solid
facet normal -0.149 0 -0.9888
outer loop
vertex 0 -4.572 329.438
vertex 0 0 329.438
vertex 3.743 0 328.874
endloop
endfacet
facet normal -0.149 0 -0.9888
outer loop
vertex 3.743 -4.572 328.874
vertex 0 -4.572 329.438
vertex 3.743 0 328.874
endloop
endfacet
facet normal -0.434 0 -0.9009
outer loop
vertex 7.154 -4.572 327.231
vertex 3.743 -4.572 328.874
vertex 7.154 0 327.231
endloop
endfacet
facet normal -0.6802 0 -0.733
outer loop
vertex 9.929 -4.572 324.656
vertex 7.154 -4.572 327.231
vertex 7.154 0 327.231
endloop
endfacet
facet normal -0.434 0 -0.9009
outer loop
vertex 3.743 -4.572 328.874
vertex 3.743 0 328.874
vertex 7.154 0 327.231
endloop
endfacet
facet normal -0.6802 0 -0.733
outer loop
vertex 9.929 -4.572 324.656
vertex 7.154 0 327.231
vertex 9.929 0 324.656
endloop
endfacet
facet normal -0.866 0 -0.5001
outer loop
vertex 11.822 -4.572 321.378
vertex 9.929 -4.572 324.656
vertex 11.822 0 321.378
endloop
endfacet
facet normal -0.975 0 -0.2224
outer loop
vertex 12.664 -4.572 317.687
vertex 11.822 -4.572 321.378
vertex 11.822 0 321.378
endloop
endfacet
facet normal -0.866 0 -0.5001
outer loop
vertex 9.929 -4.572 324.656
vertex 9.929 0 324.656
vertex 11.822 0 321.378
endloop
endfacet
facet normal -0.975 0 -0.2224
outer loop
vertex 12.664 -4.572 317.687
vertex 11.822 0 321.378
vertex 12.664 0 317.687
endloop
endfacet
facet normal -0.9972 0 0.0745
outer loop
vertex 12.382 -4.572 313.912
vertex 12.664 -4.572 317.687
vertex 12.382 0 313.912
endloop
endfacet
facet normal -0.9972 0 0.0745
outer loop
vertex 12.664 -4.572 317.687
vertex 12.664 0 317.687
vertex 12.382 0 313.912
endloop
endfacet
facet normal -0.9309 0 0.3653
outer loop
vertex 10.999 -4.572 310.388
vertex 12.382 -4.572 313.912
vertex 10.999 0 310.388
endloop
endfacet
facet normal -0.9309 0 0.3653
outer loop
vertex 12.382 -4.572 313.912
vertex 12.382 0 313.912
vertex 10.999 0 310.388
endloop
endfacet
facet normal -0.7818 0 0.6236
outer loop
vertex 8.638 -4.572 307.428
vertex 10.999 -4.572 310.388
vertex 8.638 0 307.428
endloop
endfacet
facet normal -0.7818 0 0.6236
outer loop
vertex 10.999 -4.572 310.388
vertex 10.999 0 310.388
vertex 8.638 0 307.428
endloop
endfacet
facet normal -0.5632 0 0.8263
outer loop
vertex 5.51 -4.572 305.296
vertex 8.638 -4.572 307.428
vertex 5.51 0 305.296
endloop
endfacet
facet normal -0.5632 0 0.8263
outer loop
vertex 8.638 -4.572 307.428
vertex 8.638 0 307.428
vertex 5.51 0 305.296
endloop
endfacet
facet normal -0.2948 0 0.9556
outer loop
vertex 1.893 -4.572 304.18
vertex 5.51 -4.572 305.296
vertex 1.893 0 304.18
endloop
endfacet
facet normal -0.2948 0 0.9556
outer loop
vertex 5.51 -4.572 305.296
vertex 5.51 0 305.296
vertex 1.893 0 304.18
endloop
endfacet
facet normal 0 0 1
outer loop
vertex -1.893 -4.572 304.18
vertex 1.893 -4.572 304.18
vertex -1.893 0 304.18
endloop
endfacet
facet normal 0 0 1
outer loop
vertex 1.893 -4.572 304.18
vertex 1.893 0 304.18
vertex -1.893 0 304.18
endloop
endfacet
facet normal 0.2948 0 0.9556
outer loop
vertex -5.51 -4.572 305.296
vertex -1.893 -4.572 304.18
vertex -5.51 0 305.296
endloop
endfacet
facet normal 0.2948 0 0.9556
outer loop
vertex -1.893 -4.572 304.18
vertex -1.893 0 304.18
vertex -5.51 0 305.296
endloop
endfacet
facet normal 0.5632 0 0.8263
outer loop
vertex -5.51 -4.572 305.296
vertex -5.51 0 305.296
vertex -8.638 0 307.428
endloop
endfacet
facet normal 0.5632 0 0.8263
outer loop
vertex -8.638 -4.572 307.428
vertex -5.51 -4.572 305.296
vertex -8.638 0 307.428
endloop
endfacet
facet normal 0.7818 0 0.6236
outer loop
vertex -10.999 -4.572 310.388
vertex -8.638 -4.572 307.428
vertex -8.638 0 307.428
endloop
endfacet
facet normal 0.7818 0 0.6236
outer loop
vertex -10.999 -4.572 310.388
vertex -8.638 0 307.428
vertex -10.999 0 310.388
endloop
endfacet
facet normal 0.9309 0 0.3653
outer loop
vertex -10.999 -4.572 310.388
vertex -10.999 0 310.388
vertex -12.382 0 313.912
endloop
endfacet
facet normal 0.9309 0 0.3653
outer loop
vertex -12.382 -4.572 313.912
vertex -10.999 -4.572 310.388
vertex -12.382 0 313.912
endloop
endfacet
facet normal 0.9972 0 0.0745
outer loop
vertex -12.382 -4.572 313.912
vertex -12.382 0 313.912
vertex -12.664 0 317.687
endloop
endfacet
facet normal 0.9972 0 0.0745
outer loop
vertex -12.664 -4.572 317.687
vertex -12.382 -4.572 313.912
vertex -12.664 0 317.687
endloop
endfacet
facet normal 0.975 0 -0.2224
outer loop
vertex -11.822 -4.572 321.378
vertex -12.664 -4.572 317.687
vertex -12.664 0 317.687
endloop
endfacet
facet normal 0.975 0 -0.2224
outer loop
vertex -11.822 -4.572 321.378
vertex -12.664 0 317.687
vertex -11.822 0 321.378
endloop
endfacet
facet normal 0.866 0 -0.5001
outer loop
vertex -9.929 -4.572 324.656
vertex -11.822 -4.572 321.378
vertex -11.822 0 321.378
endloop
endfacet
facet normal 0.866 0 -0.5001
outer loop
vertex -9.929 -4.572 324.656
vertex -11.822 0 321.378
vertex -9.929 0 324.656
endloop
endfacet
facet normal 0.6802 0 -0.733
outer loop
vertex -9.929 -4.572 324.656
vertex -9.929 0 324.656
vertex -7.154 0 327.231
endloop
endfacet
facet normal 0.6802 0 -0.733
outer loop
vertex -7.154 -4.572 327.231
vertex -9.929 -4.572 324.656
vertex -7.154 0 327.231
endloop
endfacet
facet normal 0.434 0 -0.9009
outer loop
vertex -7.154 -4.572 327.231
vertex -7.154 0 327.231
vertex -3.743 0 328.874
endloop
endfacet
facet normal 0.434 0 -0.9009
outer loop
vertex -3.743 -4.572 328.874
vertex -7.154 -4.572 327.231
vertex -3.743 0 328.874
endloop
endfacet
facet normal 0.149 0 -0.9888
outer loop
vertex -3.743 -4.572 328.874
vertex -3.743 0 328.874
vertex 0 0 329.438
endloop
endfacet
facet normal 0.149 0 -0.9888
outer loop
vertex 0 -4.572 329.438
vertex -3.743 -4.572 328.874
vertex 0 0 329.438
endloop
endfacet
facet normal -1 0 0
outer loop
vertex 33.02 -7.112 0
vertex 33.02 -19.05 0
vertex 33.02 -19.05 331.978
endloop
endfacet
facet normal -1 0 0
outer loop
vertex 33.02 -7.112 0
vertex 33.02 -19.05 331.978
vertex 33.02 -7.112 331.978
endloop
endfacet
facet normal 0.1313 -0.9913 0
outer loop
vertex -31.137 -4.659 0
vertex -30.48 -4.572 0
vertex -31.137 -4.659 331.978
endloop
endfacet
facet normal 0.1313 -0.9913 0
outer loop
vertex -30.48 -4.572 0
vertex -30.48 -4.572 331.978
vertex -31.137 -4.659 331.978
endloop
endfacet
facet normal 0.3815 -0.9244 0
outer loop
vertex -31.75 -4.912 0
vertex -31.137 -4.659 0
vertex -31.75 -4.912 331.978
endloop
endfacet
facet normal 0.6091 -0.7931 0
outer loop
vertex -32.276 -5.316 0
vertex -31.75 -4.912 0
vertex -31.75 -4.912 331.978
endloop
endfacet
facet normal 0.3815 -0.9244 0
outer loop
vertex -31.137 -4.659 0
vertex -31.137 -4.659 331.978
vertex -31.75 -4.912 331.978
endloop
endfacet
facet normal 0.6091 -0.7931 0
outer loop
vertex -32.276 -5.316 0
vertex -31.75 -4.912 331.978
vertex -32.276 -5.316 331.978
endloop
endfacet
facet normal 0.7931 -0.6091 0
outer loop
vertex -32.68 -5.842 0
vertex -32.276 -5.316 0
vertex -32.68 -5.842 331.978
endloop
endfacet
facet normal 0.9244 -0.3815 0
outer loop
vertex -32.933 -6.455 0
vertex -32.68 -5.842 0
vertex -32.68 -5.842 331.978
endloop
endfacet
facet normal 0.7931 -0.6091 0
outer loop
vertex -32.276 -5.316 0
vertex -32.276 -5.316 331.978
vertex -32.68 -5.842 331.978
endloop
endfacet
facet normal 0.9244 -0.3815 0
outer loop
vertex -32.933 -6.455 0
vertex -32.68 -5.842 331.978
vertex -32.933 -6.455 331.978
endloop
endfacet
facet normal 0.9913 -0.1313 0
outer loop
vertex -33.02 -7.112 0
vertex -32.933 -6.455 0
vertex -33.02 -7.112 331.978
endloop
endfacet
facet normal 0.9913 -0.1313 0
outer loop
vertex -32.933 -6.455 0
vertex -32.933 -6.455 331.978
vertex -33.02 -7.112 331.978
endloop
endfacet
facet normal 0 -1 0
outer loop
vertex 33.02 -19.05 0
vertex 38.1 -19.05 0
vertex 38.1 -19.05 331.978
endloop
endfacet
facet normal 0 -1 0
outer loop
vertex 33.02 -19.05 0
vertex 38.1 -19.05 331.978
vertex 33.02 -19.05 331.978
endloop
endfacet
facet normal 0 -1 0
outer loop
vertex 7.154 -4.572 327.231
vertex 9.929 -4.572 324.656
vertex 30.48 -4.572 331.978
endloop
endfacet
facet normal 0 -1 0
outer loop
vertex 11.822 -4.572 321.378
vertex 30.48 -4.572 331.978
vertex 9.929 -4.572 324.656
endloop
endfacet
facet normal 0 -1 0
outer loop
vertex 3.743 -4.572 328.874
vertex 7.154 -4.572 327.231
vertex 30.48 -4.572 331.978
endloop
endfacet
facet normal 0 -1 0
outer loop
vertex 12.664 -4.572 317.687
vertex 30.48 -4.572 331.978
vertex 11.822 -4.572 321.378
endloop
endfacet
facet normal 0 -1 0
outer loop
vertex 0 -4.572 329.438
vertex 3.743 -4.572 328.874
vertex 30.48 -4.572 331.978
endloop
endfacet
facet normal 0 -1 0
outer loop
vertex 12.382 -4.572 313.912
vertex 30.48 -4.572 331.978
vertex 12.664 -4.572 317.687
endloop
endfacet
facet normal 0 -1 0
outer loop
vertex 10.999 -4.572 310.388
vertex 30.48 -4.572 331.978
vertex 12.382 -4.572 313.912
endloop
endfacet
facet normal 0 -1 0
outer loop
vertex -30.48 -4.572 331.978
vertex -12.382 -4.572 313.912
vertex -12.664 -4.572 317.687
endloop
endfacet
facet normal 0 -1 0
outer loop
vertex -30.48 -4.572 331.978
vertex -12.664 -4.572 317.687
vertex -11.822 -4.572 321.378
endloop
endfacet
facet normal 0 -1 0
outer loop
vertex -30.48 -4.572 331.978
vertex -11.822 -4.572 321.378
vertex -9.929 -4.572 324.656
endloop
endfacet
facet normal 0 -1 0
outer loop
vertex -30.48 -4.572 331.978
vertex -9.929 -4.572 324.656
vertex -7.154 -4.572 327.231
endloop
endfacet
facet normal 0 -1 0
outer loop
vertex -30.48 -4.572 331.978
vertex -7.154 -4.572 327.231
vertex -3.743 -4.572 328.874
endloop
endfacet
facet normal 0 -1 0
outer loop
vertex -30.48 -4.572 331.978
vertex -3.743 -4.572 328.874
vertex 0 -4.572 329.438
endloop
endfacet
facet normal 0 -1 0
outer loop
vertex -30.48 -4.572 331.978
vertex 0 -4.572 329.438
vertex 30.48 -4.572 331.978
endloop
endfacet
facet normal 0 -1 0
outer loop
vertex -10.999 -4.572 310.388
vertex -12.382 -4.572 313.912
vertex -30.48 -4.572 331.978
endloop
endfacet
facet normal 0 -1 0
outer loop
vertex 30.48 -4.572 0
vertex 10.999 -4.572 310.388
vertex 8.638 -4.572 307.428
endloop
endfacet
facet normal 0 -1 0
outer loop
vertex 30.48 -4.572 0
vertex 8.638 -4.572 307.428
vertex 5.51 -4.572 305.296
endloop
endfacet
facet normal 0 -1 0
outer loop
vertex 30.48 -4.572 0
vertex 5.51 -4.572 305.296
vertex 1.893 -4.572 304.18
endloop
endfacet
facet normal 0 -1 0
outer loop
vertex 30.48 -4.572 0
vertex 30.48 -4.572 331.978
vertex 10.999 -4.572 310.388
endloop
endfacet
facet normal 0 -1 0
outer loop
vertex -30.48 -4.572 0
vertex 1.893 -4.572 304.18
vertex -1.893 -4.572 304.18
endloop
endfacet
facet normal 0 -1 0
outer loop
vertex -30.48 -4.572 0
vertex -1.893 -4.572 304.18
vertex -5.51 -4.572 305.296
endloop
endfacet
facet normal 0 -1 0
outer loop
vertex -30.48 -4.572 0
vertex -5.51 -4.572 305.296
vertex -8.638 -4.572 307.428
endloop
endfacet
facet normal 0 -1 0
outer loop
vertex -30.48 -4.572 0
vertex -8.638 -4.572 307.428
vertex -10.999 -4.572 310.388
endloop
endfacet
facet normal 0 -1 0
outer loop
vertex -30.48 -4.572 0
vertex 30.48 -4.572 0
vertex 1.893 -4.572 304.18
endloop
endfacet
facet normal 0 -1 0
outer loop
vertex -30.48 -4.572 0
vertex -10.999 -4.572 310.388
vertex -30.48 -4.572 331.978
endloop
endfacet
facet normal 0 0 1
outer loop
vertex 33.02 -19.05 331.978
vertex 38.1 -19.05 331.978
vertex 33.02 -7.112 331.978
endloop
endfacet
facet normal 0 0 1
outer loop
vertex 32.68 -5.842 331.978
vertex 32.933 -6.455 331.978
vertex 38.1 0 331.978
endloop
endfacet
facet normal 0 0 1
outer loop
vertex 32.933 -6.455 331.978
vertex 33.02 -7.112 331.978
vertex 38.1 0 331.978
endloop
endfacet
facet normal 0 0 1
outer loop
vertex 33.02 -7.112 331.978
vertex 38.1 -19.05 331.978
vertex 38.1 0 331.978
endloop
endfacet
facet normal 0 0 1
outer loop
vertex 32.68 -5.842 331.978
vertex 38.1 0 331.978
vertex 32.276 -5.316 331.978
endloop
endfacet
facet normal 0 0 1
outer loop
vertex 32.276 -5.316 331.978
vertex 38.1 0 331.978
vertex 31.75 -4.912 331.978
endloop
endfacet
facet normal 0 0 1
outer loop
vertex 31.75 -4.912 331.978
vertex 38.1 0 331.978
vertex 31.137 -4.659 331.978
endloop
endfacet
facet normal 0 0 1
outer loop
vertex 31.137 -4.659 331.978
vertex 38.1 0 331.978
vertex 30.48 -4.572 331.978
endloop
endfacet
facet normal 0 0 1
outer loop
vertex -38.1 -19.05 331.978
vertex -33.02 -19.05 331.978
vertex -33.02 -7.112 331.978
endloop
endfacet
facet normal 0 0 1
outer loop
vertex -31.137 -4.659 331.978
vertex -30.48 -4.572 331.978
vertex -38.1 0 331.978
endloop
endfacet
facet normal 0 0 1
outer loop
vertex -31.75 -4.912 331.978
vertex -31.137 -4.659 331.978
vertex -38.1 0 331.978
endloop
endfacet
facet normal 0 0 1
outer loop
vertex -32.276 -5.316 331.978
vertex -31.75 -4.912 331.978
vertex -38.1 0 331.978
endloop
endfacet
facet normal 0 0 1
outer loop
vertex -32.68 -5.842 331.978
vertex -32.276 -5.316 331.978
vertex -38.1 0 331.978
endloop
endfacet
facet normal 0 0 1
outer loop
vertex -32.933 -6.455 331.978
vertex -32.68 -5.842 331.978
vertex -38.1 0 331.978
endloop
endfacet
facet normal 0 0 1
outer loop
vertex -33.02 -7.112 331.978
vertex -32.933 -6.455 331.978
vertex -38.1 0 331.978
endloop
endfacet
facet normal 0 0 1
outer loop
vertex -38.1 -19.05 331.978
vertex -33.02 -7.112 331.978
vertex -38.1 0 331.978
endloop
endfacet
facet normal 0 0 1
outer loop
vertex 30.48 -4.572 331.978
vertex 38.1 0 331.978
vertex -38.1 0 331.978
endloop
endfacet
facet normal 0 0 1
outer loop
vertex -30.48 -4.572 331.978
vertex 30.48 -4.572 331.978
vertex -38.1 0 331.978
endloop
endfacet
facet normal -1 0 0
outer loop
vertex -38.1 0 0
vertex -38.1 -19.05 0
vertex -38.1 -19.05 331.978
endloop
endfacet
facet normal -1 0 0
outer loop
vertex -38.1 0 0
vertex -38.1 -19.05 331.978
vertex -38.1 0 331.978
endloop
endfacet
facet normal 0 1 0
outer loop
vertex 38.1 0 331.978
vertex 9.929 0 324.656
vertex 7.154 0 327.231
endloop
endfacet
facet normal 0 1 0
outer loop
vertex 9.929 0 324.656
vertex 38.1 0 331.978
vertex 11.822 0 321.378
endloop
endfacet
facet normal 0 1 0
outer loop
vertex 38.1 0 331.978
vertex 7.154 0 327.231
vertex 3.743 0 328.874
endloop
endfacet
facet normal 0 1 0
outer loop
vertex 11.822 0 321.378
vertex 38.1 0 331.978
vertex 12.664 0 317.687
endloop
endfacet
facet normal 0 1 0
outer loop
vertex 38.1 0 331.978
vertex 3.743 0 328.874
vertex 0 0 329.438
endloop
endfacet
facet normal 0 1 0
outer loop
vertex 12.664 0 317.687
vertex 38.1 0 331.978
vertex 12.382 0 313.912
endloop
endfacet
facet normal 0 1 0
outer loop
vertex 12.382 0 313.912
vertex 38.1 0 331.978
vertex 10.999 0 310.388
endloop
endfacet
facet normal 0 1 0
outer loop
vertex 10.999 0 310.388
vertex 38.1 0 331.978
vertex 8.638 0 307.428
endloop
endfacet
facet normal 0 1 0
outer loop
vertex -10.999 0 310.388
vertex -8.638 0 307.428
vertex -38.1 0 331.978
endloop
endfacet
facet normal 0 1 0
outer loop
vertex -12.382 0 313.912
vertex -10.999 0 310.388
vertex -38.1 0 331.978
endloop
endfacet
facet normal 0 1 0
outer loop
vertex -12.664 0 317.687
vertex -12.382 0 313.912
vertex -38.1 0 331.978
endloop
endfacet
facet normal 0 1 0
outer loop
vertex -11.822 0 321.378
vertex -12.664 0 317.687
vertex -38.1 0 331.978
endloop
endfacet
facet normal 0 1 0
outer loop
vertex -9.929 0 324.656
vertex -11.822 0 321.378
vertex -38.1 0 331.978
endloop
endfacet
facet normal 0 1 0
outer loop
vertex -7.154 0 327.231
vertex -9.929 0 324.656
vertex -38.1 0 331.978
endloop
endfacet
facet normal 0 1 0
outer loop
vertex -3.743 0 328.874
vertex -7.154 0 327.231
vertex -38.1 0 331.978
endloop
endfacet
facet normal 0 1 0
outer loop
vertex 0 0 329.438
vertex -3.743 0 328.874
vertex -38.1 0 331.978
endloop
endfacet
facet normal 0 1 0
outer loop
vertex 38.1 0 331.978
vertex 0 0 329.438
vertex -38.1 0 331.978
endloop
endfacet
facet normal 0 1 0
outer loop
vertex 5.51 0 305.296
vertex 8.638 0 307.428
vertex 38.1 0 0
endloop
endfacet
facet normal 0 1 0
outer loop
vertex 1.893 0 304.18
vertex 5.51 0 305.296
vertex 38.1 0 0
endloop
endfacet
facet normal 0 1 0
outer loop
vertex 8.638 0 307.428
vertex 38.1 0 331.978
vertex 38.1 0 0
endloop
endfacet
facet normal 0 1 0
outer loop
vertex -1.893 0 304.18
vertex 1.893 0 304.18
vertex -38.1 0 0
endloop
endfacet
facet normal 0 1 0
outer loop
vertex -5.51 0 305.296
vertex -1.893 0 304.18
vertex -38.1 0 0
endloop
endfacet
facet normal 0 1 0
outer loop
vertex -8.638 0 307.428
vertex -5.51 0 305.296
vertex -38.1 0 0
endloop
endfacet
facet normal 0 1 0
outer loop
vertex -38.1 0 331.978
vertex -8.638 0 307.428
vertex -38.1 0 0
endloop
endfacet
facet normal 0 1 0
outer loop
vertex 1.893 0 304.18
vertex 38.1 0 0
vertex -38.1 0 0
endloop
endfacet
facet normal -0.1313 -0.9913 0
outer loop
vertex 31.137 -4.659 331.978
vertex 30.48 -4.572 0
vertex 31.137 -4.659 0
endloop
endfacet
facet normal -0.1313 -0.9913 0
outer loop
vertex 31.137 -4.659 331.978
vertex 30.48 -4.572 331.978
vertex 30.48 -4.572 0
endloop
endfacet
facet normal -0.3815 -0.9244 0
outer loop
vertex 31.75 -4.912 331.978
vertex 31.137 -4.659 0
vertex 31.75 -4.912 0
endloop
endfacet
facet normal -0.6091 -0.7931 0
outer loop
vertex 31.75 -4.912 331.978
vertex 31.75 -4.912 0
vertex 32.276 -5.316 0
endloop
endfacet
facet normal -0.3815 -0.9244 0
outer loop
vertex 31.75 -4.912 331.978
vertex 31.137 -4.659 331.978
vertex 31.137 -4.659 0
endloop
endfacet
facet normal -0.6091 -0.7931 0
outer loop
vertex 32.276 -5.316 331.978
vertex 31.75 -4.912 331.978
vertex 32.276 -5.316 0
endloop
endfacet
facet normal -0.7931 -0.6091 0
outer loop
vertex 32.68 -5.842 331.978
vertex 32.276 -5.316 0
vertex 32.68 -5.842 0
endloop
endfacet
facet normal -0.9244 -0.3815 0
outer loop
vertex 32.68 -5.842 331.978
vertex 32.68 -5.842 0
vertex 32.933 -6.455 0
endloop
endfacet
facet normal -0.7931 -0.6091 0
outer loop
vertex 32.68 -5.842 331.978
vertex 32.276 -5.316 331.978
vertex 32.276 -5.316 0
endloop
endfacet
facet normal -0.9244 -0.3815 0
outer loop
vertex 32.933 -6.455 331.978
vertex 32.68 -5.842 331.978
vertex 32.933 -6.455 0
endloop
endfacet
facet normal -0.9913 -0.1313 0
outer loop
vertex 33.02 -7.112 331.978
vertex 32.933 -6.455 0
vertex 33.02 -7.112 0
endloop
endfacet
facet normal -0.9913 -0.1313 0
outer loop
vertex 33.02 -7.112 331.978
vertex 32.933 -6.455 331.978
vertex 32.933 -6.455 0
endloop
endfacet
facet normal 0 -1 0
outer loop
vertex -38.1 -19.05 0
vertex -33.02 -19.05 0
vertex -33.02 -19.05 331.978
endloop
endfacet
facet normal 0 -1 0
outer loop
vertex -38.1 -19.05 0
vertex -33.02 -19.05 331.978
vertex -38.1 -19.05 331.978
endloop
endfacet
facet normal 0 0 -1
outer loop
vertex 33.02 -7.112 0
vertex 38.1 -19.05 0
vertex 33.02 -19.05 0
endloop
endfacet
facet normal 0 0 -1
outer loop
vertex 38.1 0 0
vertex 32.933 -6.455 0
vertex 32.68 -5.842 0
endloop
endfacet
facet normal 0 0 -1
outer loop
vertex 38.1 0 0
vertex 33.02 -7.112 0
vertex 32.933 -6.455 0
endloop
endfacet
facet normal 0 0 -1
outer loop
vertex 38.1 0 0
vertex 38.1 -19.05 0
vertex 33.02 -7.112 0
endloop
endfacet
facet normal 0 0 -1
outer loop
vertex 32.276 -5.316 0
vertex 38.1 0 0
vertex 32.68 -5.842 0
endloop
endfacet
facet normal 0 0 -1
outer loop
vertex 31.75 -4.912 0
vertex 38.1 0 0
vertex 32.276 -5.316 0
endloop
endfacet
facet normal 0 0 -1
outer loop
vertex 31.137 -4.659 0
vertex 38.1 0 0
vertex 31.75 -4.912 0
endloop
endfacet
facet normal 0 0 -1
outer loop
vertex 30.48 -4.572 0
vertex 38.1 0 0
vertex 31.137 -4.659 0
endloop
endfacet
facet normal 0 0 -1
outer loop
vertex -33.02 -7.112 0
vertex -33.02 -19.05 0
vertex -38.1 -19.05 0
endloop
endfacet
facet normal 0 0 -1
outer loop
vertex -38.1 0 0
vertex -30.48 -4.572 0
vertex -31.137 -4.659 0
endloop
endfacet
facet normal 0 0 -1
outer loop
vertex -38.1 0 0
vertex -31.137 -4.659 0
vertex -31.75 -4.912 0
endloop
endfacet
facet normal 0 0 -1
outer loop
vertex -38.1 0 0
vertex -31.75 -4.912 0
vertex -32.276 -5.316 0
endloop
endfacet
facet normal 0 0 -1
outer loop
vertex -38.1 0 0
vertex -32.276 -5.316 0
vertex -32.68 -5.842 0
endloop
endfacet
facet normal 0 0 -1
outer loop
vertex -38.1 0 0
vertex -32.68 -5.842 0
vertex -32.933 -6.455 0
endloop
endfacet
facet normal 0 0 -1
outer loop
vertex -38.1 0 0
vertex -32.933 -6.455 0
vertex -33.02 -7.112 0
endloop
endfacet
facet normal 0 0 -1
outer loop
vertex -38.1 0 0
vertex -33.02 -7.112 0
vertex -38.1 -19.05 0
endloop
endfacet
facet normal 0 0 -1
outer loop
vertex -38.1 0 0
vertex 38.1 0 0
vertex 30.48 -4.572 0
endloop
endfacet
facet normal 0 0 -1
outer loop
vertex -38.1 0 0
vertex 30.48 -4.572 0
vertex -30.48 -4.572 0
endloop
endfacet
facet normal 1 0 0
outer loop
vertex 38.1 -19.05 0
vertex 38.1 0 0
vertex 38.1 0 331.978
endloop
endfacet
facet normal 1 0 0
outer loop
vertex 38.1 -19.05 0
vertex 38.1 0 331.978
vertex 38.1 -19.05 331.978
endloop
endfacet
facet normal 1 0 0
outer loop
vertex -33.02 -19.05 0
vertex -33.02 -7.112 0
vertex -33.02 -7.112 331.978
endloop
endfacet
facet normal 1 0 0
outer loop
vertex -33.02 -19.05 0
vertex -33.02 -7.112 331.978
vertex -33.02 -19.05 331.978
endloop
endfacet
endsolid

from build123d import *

# Parameters (mm, degrees)
BOSS_EXTRUDE1_DEPTH = 331.978
FILLET1_R           = 2.54
FILLET2_R           = 2.54
SKETCH2_R           = 12.7
CUT_EXTRUDE1_DEPTH  = 335.699723609


with BuildPart() as part:
    # Sketch1 → Boss-Extrude1 (new body)
    with BuildSketch(Plane.XY):
        Polygon((0, 0), (38.1, 0), (38.1, -19.05), (33.02, -19.05), (33.02, -4.572), (-33.02, -4.572), (-33.02, -19.05), (-38.1, -19.05), (-38.1, 0), align=None)
    extrude(amount=BOSS_EXTRUDE1_DEPTH)

    # Fillet1
    fillet1_edges = [part.edges().sort_by_distance(p)[0] for p in [
        (-33.02, -4.572, 165.989),
    ]]
    fillet(fillet1_edges, radius=FILLET1_R)

    # Fillet2
    fillet2_edges = [part.edges().sort_by_distance(p)[0] for p in [
        (33.02, -4.572, 165.989),
    ]]
    fillet(fillet2_edges, radius=FILLET2_R)

    # Sketch2 → Cut-Extrude1 (cut, through all)
    with BuildSketch(Plane(origin=(0, 0, 0), x_dir=(1, 0, 0), z_dir=(0, 1, 0))):
        with Locations(Location((0, -316.738, 0), (0, 0, 270))):
            Circle(SKETCH2_R)
    extrude(amount=-CUT_EXTRUDE1_DEPTH, mode=Mode.SUBTRACT)


solid = part.part
